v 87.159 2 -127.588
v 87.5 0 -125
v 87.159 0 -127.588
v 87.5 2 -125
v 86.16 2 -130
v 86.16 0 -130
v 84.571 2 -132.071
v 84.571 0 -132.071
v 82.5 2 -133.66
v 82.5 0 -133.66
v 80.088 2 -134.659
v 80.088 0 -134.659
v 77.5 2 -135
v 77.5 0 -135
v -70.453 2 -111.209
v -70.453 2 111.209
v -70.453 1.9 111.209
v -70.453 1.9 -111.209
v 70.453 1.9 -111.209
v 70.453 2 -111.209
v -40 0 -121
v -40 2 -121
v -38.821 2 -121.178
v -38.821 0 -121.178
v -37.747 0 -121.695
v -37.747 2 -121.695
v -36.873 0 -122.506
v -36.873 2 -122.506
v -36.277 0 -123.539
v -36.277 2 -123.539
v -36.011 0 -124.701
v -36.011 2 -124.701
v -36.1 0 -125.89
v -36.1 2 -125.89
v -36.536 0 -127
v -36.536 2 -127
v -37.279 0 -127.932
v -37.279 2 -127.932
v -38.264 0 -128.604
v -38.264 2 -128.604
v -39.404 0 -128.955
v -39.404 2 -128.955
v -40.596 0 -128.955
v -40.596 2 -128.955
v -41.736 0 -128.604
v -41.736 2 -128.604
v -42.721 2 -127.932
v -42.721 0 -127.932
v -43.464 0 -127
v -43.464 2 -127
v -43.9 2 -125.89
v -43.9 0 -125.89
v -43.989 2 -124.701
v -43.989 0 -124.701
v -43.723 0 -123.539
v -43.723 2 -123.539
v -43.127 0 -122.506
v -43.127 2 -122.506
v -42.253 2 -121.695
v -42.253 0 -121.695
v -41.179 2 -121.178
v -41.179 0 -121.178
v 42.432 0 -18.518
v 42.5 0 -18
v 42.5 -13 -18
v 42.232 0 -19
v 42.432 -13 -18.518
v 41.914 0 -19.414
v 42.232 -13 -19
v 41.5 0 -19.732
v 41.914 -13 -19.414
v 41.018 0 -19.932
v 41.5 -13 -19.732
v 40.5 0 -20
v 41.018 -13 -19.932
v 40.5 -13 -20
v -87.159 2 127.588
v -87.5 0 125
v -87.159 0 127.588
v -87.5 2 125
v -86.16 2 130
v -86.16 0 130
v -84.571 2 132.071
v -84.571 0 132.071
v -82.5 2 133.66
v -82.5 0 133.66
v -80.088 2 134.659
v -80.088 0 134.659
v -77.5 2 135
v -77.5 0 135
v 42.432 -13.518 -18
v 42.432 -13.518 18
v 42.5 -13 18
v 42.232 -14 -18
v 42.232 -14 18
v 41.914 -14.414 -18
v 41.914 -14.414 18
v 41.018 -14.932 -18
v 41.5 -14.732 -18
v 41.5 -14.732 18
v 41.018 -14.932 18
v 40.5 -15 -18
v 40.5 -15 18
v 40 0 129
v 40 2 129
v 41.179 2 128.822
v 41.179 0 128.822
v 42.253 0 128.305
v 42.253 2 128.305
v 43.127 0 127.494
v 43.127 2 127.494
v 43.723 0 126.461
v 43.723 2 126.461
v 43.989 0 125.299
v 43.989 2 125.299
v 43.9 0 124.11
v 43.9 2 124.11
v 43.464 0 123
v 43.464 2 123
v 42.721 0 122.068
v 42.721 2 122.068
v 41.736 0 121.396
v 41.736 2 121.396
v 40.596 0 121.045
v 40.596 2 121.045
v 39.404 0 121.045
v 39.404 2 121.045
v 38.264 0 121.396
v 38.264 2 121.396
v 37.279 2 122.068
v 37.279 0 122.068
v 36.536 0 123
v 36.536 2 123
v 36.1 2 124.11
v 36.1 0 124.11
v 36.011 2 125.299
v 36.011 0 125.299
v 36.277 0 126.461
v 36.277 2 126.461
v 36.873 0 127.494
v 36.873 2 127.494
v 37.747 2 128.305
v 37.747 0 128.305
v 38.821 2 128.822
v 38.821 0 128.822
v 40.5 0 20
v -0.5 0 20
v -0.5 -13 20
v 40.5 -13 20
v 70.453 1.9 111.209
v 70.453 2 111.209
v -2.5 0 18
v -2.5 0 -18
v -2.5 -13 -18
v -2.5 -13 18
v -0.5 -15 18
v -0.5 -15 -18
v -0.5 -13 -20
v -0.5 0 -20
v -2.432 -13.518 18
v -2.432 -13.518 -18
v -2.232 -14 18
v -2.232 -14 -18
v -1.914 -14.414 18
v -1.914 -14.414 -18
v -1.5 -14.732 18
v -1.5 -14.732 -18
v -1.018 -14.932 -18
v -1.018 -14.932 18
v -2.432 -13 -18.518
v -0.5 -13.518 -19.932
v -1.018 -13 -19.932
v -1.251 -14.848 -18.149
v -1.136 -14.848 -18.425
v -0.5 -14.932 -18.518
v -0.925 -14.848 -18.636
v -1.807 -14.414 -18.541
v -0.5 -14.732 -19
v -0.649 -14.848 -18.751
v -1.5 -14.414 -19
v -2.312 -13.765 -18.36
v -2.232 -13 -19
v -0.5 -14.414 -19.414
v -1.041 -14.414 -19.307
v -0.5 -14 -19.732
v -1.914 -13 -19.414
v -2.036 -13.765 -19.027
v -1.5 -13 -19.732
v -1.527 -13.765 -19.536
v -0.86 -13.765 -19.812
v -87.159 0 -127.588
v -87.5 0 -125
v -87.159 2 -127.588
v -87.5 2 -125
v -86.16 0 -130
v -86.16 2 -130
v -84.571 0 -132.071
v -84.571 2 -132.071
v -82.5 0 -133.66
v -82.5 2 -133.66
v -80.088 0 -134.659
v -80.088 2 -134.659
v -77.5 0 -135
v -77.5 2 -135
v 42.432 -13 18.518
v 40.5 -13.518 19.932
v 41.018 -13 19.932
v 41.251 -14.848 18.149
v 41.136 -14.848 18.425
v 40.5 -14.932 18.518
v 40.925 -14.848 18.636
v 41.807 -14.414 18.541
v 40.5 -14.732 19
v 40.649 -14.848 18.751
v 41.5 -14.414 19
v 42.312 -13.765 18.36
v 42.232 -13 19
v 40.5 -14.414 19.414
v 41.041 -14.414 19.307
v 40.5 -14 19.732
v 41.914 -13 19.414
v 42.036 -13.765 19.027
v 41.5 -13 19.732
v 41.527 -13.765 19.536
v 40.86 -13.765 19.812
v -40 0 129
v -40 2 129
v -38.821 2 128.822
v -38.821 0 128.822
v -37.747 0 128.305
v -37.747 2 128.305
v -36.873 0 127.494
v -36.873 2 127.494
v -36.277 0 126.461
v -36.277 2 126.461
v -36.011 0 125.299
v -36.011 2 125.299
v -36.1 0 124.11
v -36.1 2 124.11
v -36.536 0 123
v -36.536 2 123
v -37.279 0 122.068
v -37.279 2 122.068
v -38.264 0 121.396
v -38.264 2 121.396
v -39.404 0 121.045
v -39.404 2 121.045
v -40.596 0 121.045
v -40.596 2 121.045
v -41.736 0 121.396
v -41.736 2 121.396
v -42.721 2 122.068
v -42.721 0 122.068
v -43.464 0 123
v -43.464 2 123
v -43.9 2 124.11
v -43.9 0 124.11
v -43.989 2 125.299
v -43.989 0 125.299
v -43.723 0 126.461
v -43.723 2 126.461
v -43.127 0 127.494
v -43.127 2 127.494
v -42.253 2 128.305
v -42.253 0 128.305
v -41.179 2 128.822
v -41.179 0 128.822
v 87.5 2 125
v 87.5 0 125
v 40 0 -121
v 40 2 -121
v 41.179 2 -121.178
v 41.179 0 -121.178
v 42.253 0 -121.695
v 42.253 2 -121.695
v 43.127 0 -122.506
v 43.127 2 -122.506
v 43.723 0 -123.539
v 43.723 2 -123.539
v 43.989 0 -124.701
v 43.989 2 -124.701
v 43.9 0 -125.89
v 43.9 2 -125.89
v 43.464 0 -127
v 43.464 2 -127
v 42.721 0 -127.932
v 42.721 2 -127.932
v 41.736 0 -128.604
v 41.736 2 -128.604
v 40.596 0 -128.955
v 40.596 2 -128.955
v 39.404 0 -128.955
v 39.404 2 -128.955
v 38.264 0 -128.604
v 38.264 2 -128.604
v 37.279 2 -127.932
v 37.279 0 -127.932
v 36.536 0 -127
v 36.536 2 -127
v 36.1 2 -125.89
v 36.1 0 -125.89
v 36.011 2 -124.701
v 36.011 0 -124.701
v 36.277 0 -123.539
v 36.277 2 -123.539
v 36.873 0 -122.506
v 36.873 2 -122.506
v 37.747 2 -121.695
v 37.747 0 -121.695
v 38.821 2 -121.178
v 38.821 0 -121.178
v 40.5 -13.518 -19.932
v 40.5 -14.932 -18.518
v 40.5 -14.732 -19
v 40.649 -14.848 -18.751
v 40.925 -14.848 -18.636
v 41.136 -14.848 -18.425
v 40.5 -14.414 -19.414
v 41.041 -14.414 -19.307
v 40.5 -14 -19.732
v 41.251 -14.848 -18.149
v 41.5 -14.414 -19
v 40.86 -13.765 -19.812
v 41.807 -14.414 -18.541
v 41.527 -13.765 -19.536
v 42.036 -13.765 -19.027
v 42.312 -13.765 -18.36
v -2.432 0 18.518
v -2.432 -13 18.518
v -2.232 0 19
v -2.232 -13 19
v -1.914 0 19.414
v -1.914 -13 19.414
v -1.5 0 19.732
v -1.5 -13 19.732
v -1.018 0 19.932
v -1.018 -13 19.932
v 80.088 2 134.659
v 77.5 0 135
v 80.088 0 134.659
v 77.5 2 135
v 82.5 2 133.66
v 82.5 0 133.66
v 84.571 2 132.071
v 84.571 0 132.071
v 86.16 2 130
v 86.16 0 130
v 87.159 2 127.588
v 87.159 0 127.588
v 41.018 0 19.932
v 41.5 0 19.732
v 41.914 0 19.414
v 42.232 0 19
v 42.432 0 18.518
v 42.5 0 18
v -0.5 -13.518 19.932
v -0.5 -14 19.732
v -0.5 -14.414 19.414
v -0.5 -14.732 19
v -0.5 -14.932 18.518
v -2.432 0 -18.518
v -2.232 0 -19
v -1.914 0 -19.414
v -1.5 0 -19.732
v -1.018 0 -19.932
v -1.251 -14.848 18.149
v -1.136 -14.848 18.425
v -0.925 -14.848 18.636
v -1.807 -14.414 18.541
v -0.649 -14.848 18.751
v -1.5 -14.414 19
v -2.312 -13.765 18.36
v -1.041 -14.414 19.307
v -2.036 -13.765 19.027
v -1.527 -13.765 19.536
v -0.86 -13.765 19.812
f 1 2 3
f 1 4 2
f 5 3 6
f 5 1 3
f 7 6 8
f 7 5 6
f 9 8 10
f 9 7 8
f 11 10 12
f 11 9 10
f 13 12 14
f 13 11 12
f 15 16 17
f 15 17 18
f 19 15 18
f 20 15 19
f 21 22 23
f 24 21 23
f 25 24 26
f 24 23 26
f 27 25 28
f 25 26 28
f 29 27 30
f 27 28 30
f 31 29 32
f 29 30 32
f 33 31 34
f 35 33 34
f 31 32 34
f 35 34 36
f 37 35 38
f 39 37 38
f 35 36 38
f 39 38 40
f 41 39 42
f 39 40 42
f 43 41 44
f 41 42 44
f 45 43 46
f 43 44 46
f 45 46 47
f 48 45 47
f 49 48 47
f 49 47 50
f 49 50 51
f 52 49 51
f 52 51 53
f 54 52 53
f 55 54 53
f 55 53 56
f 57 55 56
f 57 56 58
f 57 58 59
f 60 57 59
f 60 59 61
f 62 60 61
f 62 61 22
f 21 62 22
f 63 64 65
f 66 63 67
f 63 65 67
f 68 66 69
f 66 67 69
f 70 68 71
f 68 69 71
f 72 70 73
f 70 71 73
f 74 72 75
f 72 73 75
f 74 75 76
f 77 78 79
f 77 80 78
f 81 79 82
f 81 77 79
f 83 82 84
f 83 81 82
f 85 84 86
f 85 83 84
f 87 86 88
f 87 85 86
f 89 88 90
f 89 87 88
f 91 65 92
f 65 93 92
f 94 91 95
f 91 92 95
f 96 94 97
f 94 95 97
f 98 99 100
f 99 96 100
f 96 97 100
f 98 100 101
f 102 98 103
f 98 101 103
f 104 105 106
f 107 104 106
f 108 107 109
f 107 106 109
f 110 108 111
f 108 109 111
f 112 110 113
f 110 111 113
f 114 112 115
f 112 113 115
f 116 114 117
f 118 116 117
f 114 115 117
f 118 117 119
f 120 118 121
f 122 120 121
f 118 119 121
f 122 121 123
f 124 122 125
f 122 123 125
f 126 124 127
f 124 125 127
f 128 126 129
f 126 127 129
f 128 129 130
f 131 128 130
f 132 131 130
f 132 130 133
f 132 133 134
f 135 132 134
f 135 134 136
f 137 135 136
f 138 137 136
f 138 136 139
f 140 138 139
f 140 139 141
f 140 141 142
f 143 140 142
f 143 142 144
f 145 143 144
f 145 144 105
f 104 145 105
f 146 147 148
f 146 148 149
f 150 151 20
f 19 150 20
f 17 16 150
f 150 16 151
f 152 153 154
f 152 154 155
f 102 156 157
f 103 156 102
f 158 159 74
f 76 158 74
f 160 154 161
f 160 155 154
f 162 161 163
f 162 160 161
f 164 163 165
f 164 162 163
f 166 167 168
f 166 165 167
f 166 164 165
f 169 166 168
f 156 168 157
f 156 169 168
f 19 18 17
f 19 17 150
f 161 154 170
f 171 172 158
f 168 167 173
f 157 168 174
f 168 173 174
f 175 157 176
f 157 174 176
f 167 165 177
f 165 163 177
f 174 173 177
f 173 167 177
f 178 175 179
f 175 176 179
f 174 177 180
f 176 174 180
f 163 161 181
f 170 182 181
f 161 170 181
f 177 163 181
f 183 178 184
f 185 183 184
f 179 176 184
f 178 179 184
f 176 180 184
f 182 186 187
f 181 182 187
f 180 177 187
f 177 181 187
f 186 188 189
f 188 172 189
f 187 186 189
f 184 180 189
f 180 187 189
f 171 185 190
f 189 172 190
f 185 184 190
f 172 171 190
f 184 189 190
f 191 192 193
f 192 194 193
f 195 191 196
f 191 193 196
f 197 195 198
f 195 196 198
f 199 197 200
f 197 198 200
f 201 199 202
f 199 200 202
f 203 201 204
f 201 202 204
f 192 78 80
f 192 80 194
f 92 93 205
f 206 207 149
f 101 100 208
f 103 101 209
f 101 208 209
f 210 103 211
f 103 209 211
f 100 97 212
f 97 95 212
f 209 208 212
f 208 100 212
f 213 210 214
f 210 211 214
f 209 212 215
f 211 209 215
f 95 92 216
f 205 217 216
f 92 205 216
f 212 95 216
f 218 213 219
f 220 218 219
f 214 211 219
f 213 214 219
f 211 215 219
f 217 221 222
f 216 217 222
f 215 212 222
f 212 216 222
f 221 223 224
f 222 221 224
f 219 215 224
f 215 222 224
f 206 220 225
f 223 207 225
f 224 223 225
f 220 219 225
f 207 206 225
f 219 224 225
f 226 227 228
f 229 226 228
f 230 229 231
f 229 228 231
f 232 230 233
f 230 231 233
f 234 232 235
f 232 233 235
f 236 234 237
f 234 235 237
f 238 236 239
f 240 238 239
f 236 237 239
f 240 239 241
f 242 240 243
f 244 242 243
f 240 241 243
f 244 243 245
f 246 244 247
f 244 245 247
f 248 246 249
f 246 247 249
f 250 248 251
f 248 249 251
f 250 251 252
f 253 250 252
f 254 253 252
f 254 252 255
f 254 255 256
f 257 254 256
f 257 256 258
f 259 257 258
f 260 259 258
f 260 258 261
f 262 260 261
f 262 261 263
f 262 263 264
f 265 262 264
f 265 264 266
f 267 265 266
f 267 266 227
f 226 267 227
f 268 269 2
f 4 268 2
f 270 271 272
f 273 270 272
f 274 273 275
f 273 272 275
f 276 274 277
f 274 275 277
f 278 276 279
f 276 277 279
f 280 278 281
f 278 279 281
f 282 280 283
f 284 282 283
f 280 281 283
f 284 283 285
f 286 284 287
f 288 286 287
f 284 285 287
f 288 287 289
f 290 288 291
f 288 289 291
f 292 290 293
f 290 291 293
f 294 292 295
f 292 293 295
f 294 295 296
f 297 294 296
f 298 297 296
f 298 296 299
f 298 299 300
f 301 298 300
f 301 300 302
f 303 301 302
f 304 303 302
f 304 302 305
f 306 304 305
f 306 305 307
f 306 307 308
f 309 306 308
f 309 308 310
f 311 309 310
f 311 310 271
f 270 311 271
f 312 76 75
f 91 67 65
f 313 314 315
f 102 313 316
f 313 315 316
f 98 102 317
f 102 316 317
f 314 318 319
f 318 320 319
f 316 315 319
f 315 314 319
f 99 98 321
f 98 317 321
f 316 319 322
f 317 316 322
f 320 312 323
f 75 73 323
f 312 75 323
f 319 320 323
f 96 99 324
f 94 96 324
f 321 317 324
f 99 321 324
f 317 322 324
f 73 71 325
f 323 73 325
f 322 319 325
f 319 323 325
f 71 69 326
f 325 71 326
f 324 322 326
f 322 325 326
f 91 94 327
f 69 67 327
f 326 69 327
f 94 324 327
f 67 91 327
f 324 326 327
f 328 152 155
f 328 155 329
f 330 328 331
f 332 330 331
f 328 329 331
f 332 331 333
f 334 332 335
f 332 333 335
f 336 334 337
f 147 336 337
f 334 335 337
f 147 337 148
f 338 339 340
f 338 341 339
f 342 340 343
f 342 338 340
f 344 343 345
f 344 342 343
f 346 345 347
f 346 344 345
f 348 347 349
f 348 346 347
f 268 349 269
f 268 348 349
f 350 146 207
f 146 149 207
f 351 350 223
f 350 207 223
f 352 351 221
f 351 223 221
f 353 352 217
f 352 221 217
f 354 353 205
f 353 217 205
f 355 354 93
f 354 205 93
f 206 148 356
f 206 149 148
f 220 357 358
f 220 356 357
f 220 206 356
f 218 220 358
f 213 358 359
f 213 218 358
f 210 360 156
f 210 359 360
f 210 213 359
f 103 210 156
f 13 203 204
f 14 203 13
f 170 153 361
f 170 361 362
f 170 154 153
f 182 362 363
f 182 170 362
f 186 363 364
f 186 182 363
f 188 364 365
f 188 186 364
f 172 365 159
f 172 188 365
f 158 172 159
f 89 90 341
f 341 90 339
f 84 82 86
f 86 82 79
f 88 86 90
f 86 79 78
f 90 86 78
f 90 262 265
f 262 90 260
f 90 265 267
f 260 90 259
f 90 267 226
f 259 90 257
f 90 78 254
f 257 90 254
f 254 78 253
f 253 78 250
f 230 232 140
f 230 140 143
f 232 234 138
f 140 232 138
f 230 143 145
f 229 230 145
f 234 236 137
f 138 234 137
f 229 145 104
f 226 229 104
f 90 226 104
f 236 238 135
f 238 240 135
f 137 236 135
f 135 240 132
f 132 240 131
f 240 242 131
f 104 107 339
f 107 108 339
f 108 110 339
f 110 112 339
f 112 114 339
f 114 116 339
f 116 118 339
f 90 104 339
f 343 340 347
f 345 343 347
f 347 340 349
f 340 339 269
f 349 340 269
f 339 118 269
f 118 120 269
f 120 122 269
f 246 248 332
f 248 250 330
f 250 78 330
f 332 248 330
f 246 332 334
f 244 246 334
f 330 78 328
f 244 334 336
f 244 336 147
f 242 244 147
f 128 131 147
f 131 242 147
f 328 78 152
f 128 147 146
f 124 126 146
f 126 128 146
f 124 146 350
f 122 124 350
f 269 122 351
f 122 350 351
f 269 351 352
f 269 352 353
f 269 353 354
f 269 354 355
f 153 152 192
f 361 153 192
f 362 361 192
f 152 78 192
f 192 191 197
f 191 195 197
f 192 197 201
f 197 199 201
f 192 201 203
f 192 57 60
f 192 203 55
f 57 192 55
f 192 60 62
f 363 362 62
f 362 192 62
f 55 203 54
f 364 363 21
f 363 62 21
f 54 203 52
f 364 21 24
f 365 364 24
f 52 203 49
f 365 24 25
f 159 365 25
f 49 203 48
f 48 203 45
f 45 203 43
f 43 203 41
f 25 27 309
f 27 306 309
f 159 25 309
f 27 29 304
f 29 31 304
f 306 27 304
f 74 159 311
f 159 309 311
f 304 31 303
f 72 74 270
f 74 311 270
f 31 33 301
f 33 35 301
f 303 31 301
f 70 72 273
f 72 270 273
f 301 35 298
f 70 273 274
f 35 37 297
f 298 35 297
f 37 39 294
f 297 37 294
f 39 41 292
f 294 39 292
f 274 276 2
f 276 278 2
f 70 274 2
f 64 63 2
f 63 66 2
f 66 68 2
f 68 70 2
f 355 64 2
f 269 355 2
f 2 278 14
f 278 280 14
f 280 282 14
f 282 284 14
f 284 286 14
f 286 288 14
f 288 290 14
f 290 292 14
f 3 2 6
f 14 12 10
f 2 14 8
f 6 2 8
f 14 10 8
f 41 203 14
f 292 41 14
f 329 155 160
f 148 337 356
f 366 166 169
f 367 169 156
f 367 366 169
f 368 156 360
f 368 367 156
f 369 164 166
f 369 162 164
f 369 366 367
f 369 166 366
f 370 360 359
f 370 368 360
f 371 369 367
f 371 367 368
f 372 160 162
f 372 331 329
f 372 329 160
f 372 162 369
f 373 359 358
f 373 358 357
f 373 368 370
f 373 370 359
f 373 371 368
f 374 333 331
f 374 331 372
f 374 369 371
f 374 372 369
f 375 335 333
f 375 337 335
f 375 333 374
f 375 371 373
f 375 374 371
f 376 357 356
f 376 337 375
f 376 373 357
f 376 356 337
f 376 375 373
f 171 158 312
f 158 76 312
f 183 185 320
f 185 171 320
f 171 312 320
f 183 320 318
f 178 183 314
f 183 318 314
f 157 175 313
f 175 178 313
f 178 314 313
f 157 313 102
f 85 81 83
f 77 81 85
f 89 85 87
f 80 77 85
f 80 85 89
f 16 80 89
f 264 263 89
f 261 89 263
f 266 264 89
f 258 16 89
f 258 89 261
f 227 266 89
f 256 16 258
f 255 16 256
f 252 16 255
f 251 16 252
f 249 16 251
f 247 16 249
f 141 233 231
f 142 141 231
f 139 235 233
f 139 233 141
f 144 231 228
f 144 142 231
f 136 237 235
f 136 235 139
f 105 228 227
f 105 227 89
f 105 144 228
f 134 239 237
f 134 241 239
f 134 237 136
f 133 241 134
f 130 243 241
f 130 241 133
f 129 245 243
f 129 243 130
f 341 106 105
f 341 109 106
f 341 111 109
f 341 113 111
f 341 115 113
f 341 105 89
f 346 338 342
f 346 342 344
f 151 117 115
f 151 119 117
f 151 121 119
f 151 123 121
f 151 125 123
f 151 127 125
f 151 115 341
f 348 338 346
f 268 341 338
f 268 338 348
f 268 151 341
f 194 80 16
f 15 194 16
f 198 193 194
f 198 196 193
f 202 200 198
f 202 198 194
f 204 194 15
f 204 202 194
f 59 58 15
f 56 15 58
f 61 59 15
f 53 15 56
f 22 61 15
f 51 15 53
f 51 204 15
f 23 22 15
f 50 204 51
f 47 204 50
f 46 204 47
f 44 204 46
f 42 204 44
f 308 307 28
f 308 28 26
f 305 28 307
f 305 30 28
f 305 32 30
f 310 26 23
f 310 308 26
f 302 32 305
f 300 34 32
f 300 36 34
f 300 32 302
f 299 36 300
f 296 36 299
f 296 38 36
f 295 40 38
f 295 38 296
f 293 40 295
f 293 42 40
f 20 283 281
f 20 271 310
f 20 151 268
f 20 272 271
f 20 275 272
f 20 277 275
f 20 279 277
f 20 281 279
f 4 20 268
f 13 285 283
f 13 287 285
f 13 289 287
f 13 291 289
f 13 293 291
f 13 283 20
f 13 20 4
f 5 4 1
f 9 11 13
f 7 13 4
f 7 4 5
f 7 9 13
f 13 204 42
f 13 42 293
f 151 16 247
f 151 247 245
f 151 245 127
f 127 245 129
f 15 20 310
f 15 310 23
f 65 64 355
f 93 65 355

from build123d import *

# Parameters (mm, degrees)
SKETCH_2_W          = 175
SKETCH_2_H          = 270
EXTRUDE_1_DEPTH     = 2
FILLET_1_R          = 10
SKETCH_3_R          = 4
CUT_EXTRUDE_1_DEPTH = 161.888936848
SKETCH_4_W          = 140.906747132
SKETCH_4_H          = 222.417825068
CUT_EXTRUDE_2_DEPTH = 0.1
SKETCH_5_W          = 45
SKETCH_5_H          = 40
EXTRUDE_2_DEPTH     = 15
FILLET_2_R          = 2


with BuildPart() as part:
    # 草图2 → 凸台-拉伸1 (new body)
    with BuildSketch(Plane(origin=(0, 0, 0), x_dir=(1, 0, 0), z_dir=(0, 1, 0))):
        Rectangle(SKETCH_2_W, SKETCH_2_H)
    extrude(amount=EXTRUDE_1_DEPTH)

    # 圆角1
    fillet_1_edges = [part.edges().sort_by_distance(p)[0] for p in [
        (87.5, 1, 135),
        (-87.5, 1, 135),
        (-87.5, 1, -135),
        (87.5, 1, -135),
    ]]
    fillet(fillet_1_edges, radius=FILLET_1_R)

    # 草图3 → 切除-拉伸1 (cut, through all)
    with BuildSketch(Plane(origin=(0, 2, 0), x_dir=(1, 0, 0), z_dir=(0, 1, 0))):
        with Locations(Location((-40, 125, 0), (0, 0, 270))):
            Circle(SKETCH_3_R)
        with Locations(Location((40, 125, 0), (0, 0, 270))):
            Circle(SKETCH_3_R)
        with Locations(Location((40, -125, 0), (0, 0, 270))):
            Circle(SKETCH_3_R)
        with Locations(Location((-40, -125, 0), (0, 0, 270))):
            Circle(SKETCH_3_R)
    extrude(amount=-CUT_EXTRUDE_1_DEPTH, mode=Mode.SUBTRACT)

    # 草图4 → 切除-拉伸2 (cut)
    with BuildSketch(Plane(origin=(0, 2, 0), x_dir=(1, 0, 0), z_dir=(0, 1, 0))):
        Rectangle(SKETCH_4_W, SKETCH_4_H)
    extrude(amount=-CUT_EXTRUDE_2_DEPTH, mode=Mode.SUBTRACT)

    # 草图5 → 凸台-拉伸2 (add)
    with BuildSketch(Plane.XZ):
        with Locations((20, 0)):
            Rectangle(SKETCH_5_W, SKETCH_5_H)
    extrude(amount=EXTRUDE_2_DEPTH)

    # 圆角2
    fillet_2_edges = [part.edges().sort_by_distance(p)[0] for p in [
        (-2.5, -7.5, 20),
        (-2.5, -7.5, -20),
        (42.5, -7.5, -20),
        (42.5, -7.5, 20),
        (-2.5, -15, 0),
        (20, -15, -20),
        (42.5, -15, 0),
        (20, -15, 20),
    ]]
    fillet(fillet_2_edges, radius=FILLET_2_R)


solid = part.part
